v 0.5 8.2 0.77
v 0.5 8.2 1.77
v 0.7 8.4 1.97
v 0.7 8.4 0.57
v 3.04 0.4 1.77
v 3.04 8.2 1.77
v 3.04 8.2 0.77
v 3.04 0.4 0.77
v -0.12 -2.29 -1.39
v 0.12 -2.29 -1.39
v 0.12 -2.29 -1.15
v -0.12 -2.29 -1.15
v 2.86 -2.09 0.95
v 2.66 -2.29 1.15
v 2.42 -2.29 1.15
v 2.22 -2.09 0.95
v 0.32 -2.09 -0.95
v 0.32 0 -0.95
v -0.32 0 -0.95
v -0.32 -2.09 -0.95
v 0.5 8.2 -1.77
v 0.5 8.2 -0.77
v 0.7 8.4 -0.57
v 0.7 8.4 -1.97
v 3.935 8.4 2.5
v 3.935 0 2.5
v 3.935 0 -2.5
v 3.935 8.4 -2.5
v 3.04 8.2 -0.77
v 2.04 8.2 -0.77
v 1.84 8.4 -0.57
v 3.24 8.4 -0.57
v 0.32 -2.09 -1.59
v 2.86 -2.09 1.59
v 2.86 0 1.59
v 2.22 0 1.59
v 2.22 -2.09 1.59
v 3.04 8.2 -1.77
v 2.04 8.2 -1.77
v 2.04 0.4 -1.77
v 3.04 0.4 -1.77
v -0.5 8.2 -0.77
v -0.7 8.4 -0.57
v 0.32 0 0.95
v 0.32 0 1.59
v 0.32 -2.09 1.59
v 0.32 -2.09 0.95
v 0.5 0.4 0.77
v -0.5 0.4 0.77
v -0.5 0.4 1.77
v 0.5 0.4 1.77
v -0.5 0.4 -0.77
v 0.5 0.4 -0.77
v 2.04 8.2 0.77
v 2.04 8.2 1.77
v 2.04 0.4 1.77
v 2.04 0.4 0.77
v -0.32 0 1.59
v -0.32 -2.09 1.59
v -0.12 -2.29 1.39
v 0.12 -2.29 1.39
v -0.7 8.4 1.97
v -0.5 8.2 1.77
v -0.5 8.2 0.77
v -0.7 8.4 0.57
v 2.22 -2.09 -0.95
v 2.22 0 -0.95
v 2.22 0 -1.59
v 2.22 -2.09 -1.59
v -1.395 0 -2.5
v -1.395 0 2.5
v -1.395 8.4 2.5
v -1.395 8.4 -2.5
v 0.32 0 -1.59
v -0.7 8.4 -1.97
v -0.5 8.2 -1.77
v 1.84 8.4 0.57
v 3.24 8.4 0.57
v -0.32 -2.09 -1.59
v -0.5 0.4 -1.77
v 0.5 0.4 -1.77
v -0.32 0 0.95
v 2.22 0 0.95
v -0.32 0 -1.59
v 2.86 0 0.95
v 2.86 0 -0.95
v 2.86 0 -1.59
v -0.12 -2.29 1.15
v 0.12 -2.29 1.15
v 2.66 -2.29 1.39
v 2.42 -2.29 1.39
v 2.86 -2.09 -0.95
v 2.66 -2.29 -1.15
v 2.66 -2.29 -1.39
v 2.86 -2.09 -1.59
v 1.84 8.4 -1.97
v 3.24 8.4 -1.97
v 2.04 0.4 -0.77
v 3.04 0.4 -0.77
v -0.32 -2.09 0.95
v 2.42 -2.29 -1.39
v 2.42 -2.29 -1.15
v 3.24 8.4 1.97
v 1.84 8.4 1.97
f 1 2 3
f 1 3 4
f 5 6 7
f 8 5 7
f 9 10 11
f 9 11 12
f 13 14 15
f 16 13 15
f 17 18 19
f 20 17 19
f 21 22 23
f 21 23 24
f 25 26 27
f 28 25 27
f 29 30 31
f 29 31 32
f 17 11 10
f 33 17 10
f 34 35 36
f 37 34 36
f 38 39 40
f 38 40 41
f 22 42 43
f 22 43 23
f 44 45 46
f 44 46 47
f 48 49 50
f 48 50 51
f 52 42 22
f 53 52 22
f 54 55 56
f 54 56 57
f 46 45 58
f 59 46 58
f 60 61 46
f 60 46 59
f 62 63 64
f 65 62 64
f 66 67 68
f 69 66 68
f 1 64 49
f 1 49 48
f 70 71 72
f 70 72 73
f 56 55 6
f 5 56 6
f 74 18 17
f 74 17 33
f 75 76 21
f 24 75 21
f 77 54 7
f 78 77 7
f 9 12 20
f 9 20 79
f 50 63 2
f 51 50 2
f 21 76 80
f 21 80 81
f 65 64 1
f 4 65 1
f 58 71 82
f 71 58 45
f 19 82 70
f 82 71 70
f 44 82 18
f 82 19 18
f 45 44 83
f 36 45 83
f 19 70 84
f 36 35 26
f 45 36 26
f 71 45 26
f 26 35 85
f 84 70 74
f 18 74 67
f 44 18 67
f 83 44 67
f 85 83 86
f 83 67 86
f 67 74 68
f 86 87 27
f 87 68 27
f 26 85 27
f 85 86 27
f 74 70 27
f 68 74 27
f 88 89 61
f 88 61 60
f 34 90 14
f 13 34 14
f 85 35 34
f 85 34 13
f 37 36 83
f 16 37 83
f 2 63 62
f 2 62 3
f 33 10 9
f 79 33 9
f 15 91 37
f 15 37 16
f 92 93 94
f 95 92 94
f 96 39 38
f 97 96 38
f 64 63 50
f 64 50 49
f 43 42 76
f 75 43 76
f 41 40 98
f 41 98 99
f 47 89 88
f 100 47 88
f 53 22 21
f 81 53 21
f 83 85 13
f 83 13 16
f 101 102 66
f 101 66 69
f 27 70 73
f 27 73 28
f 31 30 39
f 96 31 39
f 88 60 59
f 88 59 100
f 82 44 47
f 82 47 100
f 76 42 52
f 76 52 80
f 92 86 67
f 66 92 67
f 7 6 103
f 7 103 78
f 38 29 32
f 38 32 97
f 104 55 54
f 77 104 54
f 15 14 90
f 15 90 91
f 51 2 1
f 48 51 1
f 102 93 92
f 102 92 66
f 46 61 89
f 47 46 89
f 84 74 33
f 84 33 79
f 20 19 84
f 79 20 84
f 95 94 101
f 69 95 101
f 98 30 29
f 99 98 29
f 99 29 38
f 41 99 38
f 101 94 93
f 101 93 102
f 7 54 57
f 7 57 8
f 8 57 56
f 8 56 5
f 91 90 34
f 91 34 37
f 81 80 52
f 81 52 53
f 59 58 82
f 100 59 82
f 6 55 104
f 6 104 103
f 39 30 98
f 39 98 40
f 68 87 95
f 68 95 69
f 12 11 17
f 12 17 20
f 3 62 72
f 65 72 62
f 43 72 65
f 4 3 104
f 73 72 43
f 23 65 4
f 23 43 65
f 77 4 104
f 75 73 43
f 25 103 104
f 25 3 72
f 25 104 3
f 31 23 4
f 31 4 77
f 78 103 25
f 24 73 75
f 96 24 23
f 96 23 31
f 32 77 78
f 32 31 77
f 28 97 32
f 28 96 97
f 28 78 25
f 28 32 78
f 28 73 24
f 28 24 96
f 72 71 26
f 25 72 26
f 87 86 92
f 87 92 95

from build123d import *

# Parameters (mm, degrees)
SKETCH_1_W                         = 2.79
SKETCH_1_H                         = 5
EXTRUDE_1_DEPTH                    = 8.4
SKETCH_2_W                         = 1
SKETCH_2_H                         = 1
CUT_EXTRUDE_1_DEPTH                = 8
CHAMFER_1_SIZE                     = 0.2
SKETCH_3_W                         = 0.64
SKETCH_3_H                         = 0.64
EXTRUDE_2_DEPTH                    = 2.29
CHAMFER_2_SIZE                     = 0.2
PATTERN_LINEAR_1_COUNT             = 2
PATTERN_LINEAR_1_PITCH             = 2.54
CHAMFER_1_OF_PATTERN_LINEAR_1_SIZE = 0.2
CHAMFER_2_OF_PATTERN_LINEAR_1_SIZE = 0.2


with BuildPart() as part:
    # Эскиз1 → Бобышка-Вытянуть1 (new body)
    with BuildSketch(Plane(origin=(0, 0, 0), x_dir=(1, 0, 0), z_dir=(0, 1, 0))):
        Rectangle(SKETCH_1_W, SKETCH_1_H)
    extrude_1 = extrude(amount=EXTRUDE_1_DEPTH)

    # Эскиз2 → Вырез-Вытянуть1 (cut)
    with BuildSketch(Plane(origin=(0, 8.4, 0), x_dir=(1, 0, 0), z_dir=(0, 1, 0))):
        with Locations((0, 1.27)):
            Rectangle(SKETCH_2_W, SKETCH_2_H)
        with Locations((0, -1.27)):
            Rectangle(SKETCH_2_W, SKETCH_2_H)
    cut_extrude_1 = extrude(amount=-CUT_EXTRUDE_1_DEPTH, mode=Mode.SUBTRACT)

    # Фаска1
    chamfer_1_edges = [part.edges().sort_by_distance(p)[0] for p in [
        (0.5, 8.4, -1.27),
        (0, 8.4, -1.77),
        (-0.5, 8.4, -1.27),
        (0, 8.4, -0.77),
        (0, 8.4, 1.77),
        (0.5, 8.4, 1.27),
        (0, 8.4, 0.77),
        (-0.5, 8.4, 1.27),
    ]]
    chamfer(chamfer_1_edges, length=CHAMFER_1_SIZE)

    # Эскиз3 → Бобышка-Вытянуть2 (add)
    with BuildSketch(Plane(origin=(0, 0, 0), x_dir=(-1, 0, 0), z_dir=(0, -1, 0))):
        with Locations((0, 1.27)):
            Rectangle(SKETCH_3_W, SKETCH_3_H)
        with Locations((0, -1.27)):
            Rectangle(SKETCH_3_W, SKETCH_3_H)
    extrude_2 = extrude(amount=EXTRUDE_2_DEPTH)

    # Фаска2
    chamfer_2_edges = [part.edges().sort_by_distance(p)[0] for p in [
        (0.32, -2.29, -1.27),
        (0, -2.29, -0.95),
        (-0.32, -2.29, -1.27),
        (0, -2.29, -1.59),
        (-0.32, -2.29, 1.27),
        (0, -2.29, 0.95),
        (0.32, -2.29, 1.27),
        (0, -2.29, 1.59),
    ]]
    chamfer(chamfer_2_edges, length=CHAMFER_2_SIZE)

    # Линейный массив1: Бобышка-Вытянуть1, Вырез-Вытянуть1, Бобышка-Вытянуть2 ×2
    with Locations(*[(i * PATTERN_LINEAR_1_PITCH, 0, 0) for i in range(1, PATTERN_LINEAR_1_COUNT)]):
        add(extrude_1)
        add(cut_extrude_1, mode=Mode.SUBTRACT)
        add(extrude_2)

    # Фаска1 of Линейный массив1
    chamfer_1_of_pattern_linear_1_edges = [part.edges().sort_by_distance(p)[0] for p in [
        (3.04, 8.4, -1.27),
        (2.54, 8.4, -1.77),
        (2.04, 8.4, -1.27),
        (2.54, 8.4, -0.77),
        (2.54, 8.4, 1.77),
        (3.04, 8.4, 1.27),
        (2.54, 8.4, 0.77),
        (2.04, 8.4, 1.27),
    ]]
    chamfer(chamfer_1_of_pattern_linear_1_edges, length=CHAMFER_1_OF_PATTERN_LINEAR_1_SIZE)

    # Фаска2 of Линейный массив1
    chamfer_2_of_pattern_linear_1_edges = [part.edges().sort_by_distance(p)[0] for p in [
        (2.86, -2.29, -1.27),
        (2.54, -2.29, -0.95),
        (2.22, -2.29, -1.27),
        (2.54, -2.29, -1.59),
        (2.22, -2.29, 1.27),
        (2.54, -2.29, 0.95),
        (2.86, -2.29, 1.27),
        (2.54, -2.29, 1.59),
    ]]
    chamfer(chamfer_2_of_pattern_linear_1_edges, length=CHAMFER_2_OF_PATTERN_LINEAR_1_SIZE)


solid = part.part
